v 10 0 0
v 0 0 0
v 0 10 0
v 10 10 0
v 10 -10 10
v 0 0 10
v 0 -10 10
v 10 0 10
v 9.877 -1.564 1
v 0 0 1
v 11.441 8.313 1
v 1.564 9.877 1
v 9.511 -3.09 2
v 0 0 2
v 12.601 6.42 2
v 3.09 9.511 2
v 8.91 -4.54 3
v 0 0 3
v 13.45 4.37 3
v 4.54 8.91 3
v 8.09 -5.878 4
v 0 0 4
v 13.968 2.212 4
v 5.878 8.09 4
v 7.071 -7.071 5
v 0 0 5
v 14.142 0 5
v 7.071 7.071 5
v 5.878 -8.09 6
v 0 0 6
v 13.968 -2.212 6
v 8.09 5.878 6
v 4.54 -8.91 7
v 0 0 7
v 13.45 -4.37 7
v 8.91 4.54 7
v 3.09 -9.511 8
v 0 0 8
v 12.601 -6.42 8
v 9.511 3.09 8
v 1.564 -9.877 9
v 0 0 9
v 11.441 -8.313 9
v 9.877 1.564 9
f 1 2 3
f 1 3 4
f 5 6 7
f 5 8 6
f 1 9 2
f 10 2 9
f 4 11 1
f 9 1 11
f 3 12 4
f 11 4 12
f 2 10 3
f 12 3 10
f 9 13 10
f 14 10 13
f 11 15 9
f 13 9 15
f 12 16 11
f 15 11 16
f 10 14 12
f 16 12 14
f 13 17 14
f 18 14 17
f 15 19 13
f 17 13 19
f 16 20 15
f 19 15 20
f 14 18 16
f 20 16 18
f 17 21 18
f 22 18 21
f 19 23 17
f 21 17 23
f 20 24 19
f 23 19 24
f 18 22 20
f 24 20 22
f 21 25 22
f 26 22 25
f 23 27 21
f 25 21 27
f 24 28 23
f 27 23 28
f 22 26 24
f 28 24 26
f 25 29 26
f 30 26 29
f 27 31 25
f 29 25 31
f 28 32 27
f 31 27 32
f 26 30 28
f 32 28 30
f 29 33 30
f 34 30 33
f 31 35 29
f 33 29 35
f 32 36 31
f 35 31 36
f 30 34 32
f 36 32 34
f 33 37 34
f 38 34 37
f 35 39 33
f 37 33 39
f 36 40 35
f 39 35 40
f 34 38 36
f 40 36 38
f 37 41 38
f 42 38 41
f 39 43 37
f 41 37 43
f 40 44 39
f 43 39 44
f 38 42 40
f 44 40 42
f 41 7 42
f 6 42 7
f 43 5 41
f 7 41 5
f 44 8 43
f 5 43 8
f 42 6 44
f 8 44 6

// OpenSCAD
// With $fn set, both the slice count and the profile refinement follow it:
// $fn slices per full revolution, and the outline is resampled to $fn segments.
$fn = 40;
linear_extrude(height=10, twist=90) square(10);
